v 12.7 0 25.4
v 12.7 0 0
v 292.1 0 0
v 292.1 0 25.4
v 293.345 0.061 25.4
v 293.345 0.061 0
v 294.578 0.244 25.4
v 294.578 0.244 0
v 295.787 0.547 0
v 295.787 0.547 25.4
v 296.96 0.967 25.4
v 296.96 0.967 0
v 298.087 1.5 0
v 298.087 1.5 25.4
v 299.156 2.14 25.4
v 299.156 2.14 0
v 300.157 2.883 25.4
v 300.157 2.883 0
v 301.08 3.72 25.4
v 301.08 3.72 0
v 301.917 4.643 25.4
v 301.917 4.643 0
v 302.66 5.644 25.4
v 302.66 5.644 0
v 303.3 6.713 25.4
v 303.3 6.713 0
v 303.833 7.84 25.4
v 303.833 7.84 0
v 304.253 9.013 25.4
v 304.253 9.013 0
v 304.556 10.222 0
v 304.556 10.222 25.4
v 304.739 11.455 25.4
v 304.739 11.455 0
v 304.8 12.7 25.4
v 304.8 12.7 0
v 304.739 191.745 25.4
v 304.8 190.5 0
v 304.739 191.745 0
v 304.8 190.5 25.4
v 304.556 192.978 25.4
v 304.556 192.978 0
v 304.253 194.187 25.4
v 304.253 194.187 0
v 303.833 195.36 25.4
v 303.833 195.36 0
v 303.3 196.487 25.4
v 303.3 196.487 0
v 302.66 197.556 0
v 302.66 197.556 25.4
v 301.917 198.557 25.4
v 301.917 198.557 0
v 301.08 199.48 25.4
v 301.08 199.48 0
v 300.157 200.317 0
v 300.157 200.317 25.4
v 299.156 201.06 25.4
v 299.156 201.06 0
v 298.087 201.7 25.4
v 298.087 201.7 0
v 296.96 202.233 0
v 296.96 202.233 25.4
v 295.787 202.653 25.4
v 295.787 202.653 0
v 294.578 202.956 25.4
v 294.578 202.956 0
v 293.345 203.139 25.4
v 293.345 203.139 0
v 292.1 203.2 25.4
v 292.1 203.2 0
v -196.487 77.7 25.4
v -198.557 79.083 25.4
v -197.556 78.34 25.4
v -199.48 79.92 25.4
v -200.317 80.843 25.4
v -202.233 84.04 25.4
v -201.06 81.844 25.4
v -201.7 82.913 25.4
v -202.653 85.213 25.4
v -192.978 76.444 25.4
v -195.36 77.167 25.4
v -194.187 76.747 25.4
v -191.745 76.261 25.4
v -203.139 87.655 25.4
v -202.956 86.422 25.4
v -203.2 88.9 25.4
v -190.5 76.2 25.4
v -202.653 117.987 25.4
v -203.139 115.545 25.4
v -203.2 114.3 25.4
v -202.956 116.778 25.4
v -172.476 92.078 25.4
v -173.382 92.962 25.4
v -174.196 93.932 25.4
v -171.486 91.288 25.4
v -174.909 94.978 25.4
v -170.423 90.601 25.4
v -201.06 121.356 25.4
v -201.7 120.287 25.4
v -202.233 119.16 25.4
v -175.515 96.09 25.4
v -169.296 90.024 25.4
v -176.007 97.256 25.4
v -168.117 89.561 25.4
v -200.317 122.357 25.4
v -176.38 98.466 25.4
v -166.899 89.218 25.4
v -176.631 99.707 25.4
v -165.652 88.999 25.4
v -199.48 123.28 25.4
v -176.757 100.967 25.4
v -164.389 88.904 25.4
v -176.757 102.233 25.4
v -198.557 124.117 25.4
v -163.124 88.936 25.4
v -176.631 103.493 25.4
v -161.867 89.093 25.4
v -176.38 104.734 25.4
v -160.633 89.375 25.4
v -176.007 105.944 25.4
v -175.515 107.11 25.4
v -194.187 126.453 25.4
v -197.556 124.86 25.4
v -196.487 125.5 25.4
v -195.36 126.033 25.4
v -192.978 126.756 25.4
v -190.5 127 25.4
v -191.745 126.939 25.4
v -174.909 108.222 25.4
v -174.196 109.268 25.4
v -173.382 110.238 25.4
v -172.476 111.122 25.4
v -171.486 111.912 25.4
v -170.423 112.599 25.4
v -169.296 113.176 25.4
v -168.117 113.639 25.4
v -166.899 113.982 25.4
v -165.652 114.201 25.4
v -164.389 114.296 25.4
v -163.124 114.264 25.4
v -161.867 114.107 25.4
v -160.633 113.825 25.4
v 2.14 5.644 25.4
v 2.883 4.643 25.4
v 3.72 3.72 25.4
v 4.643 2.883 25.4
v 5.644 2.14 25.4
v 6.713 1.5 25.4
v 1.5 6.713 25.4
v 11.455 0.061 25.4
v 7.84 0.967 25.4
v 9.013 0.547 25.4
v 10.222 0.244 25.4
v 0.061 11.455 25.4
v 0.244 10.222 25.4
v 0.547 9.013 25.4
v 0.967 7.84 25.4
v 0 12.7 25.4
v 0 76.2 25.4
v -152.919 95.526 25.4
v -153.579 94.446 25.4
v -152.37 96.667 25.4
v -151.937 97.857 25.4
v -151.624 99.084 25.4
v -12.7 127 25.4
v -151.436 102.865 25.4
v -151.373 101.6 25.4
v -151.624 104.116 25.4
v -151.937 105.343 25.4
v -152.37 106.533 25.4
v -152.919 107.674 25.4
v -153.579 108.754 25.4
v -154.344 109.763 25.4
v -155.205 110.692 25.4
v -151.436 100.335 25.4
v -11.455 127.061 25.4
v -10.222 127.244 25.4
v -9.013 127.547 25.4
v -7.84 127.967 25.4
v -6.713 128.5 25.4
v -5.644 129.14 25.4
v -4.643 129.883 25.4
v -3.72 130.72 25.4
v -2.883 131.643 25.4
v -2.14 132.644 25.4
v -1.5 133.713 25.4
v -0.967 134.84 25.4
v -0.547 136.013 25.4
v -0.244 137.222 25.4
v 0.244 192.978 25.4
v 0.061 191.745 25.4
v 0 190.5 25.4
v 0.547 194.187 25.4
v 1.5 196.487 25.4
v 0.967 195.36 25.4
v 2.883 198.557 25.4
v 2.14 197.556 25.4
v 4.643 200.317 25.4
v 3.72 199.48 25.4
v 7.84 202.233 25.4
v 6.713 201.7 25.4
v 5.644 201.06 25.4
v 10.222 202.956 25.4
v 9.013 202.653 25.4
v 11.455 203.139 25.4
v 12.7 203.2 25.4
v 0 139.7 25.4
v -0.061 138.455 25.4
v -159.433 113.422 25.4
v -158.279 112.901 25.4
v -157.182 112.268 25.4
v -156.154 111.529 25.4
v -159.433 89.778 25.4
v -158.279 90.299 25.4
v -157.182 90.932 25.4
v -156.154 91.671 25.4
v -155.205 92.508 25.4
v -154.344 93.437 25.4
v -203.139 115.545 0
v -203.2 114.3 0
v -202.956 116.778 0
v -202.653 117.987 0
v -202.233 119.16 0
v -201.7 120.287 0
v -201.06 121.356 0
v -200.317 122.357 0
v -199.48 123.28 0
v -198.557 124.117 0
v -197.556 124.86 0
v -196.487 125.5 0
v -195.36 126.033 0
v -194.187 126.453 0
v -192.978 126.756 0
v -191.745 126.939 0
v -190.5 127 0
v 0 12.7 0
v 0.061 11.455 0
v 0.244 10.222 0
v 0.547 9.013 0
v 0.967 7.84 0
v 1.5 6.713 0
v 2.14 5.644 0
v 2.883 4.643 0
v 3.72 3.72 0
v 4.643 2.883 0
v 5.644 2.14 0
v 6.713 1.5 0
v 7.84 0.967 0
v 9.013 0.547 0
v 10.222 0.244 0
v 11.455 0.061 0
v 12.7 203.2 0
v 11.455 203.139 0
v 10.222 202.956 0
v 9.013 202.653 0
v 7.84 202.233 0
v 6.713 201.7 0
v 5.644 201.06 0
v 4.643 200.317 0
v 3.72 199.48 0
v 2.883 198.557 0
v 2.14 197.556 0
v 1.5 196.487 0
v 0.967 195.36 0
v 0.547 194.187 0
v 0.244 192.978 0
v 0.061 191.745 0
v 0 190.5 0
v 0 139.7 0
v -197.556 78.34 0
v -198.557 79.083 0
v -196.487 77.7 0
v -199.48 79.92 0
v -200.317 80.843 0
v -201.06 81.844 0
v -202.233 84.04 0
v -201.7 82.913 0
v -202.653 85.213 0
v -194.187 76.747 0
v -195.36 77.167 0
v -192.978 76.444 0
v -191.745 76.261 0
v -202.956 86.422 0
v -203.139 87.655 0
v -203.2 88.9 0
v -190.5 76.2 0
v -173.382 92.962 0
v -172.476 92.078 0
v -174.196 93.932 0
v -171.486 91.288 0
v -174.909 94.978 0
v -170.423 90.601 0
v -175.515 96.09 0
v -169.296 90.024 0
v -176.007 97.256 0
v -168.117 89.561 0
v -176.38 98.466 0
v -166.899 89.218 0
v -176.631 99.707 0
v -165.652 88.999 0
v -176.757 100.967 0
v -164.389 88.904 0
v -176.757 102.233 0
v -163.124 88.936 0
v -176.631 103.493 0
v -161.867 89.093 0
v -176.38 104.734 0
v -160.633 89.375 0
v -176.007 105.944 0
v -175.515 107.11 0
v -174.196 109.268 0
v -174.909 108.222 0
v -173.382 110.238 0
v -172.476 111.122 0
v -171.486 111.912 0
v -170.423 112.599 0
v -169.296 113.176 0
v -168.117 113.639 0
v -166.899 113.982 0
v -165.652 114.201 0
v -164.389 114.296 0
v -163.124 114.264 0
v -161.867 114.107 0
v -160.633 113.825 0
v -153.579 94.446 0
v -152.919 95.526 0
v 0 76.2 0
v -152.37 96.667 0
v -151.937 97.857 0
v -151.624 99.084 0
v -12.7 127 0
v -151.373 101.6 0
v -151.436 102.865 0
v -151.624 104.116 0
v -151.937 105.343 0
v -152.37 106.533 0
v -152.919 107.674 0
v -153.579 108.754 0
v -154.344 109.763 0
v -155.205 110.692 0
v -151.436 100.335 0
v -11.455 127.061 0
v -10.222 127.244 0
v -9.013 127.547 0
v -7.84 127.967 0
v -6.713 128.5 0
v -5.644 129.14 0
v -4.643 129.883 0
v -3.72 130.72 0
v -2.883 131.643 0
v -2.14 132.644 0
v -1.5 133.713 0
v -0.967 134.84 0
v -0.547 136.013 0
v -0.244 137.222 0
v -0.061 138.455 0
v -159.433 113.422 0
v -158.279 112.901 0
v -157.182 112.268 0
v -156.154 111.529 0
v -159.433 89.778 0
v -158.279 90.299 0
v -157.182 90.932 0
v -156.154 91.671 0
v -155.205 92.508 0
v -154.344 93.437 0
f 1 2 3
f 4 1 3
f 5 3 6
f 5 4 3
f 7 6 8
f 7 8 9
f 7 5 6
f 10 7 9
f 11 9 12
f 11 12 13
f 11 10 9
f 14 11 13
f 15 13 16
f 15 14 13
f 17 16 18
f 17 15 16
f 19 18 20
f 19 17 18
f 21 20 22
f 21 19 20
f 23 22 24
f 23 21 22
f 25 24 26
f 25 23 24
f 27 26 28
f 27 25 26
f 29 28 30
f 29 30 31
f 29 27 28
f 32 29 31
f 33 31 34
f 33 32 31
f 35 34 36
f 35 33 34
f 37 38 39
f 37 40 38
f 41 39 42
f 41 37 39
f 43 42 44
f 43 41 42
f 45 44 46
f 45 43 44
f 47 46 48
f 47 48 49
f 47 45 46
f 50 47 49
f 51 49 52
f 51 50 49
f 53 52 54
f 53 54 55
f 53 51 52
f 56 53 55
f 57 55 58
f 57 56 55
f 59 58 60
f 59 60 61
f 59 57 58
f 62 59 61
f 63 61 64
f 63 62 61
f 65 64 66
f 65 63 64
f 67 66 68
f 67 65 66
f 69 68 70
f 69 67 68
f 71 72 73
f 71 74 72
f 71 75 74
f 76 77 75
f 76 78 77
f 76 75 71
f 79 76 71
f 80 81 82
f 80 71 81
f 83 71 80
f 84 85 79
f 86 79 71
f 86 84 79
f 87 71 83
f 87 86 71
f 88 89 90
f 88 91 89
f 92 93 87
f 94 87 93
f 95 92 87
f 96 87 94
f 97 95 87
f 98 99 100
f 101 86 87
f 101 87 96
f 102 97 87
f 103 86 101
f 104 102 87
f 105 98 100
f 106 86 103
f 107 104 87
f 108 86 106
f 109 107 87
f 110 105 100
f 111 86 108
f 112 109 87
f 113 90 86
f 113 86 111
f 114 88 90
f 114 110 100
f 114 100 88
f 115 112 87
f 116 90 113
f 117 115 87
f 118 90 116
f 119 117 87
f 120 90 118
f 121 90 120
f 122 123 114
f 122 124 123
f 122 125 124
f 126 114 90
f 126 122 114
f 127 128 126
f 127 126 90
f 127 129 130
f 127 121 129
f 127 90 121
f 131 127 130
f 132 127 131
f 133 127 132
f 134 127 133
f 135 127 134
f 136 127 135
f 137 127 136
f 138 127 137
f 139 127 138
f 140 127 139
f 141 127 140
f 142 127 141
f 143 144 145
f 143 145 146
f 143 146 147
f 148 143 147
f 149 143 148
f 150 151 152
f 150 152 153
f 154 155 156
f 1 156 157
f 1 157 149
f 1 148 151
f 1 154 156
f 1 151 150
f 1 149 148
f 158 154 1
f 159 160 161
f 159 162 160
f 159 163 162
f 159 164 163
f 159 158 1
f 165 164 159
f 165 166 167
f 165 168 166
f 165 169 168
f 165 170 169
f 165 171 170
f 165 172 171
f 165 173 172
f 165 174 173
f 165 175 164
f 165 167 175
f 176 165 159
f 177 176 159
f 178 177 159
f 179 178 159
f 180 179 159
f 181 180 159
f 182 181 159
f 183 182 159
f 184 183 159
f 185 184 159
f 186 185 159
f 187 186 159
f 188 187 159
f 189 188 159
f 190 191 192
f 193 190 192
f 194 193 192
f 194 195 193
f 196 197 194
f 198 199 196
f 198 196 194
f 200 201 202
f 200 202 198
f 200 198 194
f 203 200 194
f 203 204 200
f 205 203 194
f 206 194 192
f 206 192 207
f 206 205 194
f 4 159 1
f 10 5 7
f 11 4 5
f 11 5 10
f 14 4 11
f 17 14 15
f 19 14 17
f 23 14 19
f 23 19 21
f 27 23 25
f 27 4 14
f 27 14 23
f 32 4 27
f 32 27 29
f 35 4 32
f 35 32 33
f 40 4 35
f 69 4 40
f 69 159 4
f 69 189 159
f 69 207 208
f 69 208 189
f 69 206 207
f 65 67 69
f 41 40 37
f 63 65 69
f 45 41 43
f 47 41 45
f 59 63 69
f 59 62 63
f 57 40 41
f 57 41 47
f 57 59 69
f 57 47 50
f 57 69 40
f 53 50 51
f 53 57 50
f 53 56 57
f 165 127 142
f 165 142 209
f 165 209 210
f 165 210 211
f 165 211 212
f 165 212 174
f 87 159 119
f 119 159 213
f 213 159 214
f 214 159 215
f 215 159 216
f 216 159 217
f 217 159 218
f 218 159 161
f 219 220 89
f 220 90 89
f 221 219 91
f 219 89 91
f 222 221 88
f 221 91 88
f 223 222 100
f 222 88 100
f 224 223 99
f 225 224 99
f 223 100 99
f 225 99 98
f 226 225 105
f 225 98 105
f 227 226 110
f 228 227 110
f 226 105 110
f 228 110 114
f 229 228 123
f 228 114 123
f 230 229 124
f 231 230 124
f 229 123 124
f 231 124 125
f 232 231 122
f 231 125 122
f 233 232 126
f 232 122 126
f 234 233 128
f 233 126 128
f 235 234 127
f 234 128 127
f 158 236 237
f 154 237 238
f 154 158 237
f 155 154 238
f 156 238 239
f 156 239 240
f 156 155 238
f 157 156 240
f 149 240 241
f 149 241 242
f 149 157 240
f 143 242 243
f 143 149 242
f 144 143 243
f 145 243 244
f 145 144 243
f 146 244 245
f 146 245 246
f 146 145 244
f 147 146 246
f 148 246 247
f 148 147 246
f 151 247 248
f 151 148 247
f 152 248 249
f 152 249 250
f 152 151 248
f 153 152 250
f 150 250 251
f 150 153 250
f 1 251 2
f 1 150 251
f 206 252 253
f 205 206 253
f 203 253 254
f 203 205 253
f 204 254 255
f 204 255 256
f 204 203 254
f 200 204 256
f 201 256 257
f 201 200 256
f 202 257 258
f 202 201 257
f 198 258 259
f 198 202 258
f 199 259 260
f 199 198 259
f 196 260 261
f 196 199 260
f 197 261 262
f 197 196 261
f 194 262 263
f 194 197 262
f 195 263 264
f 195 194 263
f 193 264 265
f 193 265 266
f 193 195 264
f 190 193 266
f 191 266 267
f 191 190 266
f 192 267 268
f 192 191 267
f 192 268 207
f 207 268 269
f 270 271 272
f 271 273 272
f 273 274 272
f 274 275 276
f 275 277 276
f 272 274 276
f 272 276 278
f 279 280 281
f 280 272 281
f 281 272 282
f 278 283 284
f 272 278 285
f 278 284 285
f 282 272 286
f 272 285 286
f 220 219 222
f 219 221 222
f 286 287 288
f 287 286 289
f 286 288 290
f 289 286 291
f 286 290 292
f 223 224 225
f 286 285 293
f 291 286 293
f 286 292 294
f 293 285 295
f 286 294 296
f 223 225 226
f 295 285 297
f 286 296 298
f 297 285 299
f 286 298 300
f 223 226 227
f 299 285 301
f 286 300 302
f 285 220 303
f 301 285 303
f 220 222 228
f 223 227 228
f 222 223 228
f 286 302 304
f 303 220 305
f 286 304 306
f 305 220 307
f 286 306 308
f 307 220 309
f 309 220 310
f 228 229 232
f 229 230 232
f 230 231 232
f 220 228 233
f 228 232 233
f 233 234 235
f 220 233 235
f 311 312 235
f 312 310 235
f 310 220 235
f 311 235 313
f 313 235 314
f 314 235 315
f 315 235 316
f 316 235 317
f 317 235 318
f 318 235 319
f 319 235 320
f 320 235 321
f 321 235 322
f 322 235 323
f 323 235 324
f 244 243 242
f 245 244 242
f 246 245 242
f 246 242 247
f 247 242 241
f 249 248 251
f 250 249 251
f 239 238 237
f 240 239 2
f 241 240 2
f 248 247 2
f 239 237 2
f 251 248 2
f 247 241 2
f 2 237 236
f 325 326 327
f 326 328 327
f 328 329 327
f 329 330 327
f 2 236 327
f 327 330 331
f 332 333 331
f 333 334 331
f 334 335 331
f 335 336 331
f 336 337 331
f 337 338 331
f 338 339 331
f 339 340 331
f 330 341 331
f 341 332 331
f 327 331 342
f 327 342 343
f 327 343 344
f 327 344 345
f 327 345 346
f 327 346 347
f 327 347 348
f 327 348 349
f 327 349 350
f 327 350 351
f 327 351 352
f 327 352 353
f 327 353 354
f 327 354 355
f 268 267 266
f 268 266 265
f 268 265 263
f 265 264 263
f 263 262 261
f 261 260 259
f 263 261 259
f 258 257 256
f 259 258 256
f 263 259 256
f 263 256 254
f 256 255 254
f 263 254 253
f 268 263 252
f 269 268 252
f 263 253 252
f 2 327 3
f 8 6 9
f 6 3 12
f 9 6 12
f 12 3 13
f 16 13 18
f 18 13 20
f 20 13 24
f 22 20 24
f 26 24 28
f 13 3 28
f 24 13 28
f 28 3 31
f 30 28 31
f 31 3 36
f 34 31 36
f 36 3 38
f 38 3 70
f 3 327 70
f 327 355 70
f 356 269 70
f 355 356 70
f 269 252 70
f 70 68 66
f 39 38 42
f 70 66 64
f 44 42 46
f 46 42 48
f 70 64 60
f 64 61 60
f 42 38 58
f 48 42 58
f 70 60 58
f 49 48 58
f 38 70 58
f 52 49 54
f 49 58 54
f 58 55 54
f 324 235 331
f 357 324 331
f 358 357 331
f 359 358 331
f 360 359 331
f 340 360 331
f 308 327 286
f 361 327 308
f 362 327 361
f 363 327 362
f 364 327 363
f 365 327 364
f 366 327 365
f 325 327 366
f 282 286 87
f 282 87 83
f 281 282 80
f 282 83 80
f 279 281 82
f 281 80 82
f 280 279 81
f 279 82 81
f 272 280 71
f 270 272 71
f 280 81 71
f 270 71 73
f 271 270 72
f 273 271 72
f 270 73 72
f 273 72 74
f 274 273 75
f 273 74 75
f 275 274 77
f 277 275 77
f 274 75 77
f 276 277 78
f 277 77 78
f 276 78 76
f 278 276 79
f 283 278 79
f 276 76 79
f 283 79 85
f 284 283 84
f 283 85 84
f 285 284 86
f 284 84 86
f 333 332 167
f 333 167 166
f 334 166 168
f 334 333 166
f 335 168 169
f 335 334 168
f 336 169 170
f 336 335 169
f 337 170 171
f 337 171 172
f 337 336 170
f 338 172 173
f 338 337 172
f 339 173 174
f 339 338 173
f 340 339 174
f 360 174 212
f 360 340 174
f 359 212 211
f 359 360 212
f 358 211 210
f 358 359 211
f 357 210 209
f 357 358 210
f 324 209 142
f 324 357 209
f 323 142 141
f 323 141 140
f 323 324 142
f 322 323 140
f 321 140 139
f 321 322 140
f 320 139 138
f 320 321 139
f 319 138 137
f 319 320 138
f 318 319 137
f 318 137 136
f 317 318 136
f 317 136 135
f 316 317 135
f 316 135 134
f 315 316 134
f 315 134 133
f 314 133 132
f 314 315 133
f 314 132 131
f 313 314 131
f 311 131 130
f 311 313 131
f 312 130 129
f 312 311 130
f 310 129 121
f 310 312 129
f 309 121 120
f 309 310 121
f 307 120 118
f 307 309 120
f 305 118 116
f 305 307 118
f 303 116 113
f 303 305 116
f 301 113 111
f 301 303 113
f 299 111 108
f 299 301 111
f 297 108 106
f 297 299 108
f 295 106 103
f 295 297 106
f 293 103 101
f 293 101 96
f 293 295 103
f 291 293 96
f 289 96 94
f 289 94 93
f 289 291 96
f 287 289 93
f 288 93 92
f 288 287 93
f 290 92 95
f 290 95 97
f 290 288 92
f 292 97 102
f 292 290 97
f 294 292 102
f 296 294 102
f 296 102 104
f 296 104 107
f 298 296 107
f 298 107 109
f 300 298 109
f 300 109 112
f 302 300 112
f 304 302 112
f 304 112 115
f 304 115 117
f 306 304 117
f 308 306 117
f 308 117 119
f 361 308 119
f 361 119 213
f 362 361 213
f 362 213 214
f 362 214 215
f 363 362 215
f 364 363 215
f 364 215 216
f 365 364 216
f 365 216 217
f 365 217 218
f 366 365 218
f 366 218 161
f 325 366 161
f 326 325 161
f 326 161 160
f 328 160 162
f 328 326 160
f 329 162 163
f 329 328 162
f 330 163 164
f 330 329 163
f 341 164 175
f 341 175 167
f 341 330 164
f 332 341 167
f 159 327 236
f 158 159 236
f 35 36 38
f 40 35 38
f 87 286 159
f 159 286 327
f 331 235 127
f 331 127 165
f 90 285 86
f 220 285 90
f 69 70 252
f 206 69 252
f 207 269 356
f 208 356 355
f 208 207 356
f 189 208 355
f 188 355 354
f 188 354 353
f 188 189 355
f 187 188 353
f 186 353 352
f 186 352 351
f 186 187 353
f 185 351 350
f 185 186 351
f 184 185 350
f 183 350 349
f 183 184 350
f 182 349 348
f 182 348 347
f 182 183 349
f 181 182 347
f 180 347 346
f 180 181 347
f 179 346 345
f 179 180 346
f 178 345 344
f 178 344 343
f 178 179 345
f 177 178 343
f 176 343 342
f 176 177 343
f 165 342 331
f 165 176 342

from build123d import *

# Parameters (mm, degrees)
F0_W     = 203.2
F0_H     = 50.8
F0_R     = 12.7
F1_DEPTH = 25.4
F2_R     = 12.7
F3_R     = 12.7


with BuildPart() as f1:
    # F0 (on Top) → F1 (new body)
    with BuildSketch(Plane.XY):
        Polygon((0, 76.2), (0, 0), (304.8, 0), (304.8, 203.2), (0, 203.2), (0, 127), align=None)
        with Locations((-101.6, 101.6)):
            Rectangle(F0_W, F0_H)
        with Locations((-164.072603, 101.6)):
            Circle(F0_R, mode=Mode.SUBTRACT)
    extrude(amount=F1_DEPTH)

    # F2
    f2_edges = [f1.edges().sort_by_distance(p)[0] for p in [
        (0, 127, 12.7),
        (-203.2, 127, 12.7),
        (-203.2, 76.2, 12.7),
    ]]
    fillet(f2_edges, radius=F2_R)

    # F3
    f3_edges = [f1.edges().sort_by_distance(p)[0] for p in [
        (0, 203.2, 12.7),
        (304.8, 203.2, 12.7),
        (304.8, 0, 12.7),
        (0, 0, 12.7),
    ]]
    fillet(f3_edges, radius=F3_R)


solid = f1.part
